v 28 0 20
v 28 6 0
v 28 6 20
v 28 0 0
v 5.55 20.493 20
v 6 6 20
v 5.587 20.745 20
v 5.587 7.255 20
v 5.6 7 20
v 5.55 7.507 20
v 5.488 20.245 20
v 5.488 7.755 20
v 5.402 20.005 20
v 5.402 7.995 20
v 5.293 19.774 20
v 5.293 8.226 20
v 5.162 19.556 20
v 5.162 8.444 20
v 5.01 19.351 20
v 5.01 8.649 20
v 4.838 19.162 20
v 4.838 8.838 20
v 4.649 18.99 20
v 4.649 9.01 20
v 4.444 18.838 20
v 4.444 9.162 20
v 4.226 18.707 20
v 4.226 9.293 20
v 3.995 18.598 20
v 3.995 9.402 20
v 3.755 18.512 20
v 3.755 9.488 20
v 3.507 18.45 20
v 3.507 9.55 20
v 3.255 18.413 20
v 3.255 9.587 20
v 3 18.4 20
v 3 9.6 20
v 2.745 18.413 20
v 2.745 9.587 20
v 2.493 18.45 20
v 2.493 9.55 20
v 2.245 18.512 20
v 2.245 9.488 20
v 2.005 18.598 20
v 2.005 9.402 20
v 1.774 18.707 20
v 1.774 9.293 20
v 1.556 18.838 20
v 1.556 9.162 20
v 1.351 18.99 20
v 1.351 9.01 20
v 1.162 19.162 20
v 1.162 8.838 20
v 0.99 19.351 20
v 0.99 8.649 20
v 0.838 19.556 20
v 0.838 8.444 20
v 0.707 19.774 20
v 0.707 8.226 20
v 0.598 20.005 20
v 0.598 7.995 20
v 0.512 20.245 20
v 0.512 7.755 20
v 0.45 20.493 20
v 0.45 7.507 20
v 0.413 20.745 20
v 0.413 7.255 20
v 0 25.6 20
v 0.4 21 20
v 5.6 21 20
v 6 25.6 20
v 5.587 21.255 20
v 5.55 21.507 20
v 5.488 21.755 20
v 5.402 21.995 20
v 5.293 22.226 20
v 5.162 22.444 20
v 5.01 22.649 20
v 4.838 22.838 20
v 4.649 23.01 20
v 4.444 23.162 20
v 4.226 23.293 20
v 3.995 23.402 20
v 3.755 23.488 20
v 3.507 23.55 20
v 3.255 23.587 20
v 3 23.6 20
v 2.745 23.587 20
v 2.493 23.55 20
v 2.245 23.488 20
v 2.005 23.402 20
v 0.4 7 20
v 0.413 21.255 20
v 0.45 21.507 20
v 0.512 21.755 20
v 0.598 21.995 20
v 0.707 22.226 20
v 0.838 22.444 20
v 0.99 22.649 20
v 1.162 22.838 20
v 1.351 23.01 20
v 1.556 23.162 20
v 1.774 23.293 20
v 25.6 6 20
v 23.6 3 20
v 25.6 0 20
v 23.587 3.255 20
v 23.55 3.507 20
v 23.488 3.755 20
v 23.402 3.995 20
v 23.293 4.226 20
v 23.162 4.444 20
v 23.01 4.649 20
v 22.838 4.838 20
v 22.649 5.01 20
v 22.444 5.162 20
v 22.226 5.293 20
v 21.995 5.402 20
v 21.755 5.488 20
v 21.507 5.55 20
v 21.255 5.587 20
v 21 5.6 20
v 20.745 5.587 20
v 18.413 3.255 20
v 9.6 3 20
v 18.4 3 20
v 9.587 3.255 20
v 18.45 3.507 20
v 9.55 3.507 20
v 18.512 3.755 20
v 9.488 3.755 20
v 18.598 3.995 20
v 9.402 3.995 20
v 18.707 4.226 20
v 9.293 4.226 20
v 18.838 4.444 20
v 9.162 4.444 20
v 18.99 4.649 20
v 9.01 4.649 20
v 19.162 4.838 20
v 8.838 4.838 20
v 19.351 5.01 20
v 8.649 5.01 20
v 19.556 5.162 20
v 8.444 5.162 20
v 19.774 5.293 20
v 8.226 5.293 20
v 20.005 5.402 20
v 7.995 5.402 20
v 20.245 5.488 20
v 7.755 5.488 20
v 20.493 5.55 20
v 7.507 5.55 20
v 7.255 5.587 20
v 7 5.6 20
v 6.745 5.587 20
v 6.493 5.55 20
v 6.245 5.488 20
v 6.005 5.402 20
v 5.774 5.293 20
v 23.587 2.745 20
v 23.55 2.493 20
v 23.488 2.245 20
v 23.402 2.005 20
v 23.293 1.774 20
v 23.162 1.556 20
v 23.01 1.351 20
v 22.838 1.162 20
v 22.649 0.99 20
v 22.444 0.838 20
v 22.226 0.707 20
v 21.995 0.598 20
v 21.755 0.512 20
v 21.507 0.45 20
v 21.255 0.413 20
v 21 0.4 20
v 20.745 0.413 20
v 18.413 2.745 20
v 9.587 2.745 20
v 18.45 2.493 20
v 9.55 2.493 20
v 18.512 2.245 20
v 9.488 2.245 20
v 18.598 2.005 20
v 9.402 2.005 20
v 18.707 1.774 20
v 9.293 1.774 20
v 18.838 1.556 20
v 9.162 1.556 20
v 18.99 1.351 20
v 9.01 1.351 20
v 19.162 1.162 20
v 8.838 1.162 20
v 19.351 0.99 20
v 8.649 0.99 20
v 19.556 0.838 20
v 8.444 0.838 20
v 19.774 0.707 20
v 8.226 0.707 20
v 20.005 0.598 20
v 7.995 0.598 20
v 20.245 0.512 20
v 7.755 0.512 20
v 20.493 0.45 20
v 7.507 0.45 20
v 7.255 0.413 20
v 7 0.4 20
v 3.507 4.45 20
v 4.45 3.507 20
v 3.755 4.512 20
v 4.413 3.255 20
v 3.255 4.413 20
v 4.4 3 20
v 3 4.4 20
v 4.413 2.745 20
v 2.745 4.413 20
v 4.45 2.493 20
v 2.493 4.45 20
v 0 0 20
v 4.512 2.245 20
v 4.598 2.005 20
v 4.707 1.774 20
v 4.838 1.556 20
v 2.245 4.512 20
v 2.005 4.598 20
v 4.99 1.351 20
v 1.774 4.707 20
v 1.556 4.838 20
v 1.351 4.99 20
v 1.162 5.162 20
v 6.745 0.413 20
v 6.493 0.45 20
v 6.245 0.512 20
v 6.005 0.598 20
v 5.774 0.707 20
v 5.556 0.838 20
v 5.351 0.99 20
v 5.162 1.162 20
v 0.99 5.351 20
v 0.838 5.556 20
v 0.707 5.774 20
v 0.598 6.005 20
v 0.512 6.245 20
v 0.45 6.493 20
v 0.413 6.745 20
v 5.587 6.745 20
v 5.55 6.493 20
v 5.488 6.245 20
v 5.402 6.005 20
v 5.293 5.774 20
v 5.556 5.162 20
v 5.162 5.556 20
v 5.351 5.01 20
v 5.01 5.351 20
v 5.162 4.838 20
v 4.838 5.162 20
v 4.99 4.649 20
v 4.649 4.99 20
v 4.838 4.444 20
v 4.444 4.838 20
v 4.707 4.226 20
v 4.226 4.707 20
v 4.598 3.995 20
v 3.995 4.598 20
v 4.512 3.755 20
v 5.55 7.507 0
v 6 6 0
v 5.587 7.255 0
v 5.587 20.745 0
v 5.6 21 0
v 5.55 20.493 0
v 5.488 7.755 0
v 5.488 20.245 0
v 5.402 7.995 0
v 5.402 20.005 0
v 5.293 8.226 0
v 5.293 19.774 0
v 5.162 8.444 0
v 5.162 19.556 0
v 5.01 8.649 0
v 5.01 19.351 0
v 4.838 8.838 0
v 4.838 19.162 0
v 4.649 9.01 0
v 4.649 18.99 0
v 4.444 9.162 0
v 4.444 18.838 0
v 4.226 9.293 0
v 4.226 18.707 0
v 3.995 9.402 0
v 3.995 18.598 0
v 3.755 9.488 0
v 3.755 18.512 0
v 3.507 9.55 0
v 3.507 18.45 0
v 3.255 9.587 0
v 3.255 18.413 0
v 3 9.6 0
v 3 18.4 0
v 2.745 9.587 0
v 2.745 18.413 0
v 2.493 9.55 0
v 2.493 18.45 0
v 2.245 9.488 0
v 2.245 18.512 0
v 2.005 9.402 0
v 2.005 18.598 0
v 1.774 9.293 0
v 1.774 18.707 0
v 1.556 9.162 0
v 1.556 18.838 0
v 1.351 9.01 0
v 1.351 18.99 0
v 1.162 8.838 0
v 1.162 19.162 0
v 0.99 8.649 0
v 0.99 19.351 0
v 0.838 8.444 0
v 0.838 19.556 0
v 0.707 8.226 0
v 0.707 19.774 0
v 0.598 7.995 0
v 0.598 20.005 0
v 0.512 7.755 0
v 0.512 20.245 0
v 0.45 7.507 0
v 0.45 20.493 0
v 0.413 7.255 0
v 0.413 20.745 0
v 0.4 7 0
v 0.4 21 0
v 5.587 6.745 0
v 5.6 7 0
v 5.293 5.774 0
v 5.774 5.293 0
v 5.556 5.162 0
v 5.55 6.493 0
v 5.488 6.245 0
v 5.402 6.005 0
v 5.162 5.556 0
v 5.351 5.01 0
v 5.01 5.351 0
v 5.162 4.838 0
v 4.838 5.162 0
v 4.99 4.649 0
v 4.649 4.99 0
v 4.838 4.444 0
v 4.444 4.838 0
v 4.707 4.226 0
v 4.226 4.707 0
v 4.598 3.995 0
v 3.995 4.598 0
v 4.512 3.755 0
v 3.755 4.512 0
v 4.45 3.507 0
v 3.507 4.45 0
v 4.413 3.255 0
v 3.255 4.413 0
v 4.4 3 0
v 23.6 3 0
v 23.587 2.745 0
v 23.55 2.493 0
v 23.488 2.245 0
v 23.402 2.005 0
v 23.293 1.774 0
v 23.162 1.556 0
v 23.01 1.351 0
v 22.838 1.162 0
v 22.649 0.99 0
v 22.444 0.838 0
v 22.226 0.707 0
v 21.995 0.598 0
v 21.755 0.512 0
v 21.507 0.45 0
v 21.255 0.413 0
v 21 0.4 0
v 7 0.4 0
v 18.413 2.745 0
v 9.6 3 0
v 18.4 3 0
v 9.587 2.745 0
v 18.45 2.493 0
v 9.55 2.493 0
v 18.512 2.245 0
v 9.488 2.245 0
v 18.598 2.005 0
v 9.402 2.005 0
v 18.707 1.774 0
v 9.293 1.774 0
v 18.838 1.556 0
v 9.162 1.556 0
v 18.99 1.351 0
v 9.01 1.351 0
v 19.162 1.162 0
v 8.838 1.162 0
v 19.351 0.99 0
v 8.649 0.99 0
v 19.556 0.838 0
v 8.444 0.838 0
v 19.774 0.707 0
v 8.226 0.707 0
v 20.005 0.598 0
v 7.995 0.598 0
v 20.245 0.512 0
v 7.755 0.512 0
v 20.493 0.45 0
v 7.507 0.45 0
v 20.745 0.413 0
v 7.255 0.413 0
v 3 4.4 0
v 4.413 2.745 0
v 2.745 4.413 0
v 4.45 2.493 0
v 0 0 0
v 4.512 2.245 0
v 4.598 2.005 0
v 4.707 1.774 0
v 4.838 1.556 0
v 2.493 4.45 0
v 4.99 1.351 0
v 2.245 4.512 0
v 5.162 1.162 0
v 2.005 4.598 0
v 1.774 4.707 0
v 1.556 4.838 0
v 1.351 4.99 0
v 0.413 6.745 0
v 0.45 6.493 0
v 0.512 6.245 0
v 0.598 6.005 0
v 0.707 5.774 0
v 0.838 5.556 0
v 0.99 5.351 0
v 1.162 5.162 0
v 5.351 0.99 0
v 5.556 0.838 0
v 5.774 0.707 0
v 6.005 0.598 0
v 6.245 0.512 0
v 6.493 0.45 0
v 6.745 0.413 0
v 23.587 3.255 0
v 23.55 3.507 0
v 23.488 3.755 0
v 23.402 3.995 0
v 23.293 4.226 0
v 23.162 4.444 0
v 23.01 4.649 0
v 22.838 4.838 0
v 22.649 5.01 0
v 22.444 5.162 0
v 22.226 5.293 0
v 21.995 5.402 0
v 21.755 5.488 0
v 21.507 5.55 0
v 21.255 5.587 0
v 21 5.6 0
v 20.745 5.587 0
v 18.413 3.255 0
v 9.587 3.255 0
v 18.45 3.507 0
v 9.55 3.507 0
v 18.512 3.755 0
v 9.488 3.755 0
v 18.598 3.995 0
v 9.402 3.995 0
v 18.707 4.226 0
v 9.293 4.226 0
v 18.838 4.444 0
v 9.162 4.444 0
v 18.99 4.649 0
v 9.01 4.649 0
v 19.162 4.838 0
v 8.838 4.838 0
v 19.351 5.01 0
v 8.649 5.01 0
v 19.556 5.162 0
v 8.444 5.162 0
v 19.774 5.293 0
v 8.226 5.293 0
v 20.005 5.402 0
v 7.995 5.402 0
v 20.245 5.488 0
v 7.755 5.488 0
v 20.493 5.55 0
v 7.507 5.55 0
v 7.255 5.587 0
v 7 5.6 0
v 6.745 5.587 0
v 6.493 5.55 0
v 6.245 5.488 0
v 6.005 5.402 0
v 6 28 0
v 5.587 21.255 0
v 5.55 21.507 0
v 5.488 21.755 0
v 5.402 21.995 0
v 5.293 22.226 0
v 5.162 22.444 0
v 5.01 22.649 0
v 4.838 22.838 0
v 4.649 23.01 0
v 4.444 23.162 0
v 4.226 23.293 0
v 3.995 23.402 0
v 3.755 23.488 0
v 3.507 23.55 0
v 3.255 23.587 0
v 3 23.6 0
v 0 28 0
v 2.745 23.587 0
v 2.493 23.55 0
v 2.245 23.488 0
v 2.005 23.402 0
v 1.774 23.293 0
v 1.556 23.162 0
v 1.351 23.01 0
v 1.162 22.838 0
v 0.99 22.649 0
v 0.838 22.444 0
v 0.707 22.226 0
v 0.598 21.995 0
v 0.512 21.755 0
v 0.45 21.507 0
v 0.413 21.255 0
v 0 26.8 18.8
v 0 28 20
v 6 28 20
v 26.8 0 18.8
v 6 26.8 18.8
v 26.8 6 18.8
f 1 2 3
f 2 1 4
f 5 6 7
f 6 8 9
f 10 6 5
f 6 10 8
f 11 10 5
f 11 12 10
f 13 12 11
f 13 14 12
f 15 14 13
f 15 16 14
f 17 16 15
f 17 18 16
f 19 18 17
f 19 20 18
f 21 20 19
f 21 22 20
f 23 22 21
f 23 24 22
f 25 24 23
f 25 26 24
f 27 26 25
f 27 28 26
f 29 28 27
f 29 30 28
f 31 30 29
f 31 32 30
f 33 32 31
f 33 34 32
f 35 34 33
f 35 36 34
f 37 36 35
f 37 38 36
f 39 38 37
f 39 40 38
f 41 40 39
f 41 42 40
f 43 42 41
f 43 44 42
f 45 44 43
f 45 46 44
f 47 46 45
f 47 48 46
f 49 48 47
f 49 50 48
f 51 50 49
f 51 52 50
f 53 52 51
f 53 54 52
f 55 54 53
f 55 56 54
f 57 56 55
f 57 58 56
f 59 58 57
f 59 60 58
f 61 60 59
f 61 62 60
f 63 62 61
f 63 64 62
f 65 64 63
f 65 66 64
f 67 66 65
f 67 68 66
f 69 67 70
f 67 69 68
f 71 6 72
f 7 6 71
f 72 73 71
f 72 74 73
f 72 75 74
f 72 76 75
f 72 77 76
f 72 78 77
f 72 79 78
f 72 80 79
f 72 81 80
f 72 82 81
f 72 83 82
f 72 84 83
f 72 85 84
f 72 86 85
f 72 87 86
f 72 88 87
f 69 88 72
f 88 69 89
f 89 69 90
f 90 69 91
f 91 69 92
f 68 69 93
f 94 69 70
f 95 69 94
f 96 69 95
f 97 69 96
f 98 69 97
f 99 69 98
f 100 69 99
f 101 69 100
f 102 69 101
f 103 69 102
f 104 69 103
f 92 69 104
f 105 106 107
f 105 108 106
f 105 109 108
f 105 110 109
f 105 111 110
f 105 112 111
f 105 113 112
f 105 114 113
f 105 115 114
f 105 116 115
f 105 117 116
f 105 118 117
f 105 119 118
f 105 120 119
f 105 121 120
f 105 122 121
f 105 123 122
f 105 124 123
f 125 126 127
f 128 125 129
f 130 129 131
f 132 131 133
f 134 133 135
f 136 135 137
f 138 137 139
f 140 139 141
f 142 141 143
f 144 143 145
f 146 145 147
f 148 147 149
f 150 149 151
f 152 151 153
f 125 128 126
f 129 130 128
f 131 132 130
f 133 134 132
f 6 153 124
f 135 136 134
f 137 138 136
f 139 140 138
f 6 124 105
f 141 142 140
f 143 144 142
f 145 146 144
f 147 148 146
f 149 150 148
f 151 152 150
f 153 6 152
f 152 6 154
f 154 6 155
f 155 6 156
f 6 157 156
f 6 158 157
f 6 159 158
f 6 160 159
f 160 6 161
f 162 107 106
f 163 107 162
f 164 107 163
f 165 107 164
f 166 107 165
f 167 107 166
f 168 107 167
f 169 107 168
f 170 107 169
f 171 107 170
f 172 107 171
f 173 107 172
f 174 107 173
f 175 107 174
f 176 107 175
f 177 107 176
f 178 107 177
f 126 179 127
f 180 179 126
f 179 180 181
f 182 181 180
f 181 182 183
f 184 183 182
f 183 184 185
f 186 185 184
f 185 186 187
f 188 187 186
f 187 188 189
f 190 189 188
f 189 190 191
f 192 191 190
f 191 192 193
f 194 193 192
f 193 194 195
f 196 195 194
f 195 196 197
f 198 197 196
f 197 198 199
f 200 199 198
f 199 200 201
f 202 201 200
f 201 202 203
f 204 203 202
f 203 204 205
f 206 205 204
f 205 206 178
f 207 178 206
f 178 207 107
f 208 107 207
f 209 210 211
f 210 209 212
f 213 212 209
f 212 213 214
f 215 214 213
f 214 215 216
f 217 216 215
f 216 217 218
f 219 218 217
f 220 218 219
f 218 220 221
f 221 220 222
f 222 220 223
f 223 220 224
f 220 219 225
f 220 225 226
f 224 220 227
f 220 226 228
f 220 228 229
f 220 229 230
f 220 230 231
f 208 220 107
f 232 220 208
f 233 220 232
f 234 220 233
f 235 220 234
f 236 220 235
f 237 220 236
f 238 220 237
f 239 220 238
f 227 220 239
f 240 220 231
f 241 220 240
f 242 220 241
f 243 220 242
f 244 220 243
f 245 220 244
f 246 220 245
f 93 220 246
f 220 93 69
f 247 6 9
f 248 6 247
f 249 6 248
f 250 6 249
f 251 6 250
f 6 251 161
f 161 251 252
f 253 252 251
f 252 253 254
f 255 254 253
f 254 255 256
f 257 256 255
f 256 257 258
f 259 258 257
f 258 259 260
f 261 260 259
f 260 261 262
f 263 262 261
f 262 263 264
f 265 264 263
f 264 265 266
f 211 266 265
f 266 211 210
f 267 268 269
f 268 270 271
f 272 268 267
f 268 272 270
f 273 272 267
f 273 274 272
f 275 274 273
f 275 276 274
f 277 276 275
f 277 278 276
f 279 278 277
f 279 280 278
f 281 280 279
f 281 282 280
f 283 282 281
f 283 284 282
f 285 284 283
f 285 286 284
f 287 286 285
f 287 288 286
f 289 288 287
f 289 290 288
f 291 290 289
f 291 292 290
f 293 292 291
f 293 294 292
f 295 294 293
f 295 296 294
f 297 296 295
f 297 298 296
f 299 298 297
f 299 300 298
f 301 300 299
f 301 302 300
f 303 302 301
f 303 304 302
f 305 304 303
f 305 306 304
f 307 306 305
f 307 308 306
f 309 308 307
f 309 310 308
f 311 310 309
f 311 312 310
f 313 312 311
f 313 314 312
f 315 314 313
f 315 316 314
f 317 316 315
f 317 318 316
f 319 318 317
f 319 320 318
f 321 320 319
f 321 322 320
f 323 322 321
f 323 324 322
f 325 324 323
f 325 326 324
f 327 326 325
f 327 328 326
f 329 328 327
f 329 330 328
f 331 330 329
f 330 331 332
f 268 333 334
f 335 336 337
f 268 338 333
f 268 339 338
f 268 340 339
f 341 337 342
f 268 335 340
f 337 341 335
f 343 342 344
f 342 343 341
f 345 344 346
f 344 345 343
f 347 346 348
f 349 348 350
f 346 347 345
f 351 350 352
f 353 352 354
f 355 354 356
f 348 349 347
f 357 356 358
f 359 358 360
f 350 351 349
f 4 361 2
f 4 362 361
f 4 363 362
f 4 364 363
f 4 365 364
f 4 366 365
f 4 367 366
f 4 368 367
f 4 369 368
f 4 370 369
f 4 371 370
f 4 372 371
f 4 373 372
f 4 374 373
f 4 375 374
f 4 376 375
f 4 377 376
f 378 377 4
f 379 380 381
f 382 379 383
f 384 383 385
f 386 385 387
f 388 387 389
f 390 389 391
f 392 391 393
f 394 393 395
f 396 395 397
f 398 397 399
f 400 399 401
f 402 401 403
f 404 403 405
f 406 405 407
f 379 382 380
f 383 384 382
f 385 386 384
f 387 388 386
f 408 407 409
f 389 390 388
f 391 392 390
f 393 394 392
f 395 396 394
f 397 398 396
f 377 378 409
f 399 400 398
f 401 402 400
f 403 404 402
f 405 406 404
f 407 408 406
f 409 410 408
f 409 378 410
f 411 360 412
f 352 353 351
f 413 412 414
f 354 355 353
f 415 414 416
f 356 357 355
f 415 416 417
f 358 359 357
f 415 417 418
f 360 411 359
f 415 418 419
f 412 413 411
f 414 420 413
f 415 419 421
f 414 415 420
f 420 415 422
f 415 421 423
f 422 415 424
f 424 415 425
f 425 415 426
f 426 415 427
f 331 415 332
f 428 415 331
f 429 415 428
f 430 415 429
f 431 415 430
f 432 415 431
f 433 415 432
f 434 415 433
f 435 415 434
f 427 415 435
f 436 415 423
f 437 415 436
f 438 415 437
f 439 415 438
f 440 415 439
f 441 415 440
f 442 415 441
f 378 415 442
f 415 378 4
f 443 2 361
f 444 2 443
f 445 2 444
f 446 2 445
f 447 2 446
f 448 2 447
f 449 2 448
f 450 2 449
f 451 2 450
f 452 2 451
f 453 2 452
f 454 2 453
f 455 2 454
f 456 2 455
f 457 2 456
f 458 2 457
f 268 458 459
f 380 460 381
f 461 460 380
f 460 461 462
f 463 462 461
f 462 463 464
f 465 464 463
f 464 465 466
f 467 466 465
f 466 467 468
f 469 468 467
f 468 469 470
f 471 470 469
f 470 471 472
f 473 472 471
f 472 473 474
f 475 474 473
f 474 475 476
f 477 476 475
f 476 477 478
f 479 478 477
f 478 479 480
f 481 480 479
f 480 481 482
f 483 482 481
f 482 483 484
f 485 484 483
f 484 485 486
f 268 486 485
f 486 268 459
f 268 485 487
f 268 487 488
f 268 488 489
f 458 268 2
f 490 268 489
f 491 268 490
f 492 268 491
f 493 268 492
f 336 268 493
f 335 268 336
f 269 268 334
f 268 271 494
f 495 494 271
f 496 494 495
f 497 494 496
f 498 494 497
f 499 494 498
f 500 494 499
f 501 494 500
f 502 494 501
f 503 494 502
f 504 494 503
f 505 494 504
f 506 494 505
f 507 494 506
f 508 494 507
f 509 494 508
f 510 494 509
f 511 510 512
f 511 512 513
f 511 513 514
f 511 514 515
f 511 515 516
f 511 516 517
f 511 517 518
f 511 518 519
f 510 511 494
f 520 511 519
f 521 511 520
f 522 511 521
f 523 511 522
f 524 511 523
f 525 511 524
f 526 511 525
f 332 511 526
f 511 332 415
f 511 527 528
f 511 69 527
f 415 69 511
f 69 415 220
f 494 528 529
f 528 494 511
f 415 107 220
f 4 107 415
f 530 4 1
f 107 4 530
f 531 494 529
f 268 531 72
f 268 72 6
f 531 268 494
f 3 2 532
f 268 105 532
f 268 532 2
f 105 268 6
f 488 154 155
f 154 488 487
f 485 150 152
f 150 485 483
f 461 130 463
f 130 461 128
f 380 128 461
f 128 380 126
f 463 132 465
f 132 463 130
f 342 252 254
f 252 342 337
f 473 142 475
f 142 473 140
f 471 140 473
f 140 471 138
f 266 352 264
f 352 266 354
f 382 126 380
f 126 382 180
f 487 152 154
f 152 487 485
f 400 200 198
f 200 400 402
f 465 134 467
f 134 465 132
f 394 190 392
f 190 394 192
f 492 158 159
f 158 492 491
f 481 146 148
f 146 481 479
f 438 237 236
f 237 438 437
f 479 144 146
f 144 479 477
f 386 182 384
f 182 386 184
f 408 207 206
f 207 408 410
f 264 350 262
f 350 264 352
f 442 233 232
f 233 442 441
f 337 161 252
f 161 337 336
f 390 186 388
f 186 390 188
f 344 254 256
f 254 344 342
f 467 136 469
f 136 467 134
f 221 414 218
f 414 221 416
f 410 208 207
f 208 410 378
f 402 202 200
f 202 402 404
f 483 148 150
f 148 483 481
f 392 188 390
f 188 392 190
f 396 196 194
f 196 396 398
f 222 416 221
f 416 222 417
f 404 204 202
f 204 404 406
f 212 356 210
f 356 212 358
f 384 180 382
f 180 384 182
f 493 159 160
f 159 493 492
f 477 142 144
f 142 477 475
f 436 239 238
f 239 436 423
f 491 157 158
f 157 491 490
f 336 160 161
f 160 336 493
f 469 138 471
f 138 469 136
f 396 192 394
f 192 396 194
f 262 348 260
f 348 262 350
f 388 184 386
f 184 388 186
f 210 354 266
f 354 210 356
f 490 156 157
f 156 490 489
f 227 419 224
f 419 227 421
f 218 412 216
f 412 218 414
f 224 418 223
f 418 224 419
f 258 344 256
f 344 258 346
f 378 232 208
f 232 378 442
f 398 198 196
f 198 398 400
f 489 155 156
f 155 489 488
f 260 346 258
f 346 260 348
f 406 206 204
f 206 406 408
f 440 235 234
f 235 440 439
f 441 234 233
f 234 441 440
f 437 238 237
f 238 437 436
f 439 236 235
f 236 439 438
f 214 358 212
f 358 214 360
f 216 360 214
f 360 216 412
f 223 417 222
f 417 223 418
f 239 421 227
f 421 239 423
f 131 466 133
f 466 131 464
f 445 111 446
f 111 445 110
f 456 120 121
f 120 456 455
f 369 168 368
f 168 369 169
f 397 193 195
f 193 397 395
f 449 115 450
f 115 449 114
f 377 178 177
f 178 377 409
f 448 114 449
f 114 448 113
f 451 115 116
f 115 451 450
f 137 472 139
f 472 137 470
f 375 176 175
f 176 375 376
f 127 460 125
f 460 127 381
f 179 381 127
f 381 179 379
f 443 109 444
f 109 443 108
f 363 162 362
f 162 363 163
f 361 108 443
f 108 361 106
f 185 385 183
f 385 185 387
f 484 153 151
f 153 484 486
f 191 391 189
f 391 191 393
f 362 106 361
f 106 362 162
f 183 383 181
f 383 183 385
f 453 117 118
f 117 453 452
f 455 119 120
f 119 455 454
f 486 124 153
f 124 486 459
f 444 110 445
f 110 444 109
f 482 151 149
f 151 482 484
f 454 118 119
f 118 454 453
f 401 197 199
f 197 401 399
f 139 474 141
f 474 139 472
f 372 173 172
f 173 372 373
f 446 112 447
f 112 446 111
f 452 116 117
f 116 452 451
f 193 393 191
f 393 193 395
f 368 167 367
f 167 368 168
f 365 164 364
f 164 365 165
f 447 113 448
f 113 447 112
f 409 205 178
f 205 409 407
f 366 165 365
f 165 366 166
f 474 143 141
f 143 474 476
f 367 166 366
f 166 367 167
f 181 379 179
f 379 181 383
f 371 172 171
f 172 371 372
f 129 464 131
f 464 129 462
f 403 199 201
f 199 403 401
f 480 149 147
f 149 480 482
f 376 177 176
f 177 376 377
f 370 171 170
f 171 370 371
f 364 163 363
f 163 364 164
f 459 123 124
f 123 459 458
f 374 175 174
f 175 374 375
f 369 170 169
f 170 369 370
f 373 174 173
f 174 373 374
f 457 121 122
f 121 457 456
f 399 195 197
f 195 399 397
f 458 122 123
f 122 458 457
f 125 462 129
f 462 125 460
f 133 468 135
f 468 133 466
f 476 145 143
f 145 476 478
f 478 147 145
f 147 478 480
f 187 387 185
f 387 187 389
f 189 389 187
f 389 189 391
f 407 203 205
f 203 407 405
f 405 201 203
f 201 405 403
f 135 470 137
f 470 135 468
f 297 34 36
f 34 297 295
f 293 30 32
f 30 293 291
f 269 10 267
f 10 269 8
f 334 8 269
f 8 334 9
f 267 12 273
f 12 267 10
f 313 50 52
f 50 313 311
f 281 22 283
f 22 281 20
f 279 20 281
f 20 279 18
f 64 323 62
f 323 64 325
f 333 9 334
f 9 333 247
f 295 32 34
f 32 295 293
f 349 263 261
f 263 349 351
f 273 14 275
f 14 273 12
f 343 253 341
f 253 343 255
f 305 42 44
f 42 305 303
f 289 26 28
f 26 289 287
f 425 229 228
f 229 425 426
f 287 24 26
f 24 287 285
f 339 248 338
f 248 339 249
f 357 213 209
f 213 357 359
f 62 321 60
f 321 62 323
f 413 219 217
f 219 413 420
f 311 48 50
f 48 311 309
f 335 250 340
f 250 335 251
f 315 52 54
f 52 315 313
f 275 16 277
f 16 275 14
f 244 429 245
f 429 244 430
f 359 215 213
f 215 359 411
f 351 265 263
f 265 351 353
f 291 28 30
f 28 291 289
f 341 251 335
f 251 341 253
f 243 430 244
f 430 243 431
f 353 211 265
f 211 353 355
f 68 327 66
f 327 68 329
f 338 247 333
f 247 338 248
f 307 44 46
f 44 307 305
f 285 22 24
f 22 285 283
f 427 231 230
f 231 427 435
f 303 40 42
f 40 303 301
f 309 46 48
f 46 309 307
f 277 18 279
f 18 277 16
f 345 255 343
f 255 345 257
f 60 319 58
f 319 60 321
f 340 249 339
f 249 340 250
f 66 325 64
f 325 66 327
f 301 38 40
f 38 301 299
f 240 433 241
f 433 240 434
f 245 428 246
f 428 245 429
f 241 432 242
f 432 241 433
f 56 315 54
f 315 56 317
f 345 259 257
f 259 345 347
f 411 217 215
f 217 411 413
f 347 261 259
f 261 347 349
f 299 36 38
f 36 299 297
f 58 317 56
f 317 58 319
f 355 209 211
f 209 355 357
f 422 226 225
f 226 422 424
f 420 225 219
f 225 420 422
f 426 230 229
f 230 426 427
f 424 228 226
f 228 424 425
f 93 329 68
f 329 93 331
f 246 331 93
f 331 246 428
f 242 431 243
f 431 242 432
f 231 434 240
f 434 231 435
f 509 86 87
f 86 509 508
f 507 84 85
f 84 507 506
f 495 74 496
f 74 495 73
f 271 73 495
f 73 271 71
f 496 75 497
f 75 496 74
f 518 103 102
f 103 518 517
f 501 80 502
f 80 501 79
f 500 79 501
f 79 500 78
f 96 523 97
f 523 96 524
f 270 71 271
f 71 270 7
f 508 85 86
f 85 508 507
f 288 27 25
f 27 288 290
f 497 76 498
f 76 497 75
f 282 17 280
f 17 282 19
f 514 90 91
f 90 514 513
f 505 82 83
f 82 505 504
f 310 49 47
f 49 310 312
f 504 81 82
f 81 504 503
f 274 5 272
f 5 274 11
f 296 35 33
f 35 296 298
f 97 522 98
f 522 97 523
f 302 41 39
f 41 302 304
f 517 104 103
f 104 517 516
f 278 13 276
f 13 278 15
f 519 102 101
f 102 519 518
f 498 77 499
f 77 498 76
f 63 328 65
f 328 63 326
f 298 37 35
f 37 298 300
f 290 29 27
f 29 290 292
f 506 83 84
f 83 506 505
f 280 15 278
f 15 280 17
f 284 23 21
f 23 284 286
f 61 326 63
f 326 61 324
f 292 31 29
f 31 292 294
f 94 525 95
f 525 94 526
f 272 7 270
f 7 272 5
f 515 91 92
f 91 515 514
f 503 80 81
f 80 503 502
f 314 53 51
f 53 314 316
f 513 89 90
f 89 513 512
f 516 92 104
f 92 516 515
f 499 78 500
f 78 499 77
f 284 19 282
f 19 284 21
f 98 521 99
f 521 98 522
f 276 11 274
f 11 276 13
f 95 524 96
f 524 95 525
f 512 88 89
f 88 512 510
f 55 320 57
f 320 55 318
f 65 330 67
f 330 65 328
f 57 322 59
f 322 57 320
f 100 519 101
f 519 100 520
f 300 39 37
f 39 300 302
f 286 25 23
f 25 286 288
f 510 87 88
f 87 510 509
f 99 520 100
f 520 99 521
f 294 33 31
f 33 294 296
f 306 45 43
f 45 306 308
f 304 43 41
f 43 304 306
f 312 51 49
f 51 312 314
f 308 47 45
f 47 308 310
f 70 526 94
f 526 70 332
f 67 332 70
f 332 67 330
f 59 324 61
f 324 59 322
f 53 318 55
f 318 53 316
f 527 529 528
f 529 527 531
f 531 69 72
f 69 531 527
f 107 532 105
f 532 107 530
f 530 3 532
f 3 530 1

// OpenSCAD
$fn = 64;

// A extrusion bracket overall: [28, 28, 20]
module corner_bracket(size=[28,28,20], wall=6, hole_d=5.2, hole_edge=7, chamfer=1.2) {
    sx = size[0];
    sy = size[1];
    sz = size[2];

    // Keep walls valid
    wall2 = min(wall, min(sx,sy)/2 - 0.5);

    difference() {
        // Main connected L-bracket body (one solid)
        // Outer block minus inner corner to form an L in plan view
        difference() {
            cube([sx, sy, sz], center=false);

            // Inner void to create L shape (opens to +X,+Y)
            translate([wall2, wall2, -0.1])
                cube([sx - wall2, sy - wall2, sz + 0.2], center=false);
        }

        // Mounting holes (2 per leg), through thickness (Z)
        // Leg along X (bottom flange): y within [0, wall2]
        for (xpos = [hole_edge, sx - hole_edge]) {
            translate([xpos, wall2/2, sz/2])
                cylinder(h=sz + 0.6, d=hole_d, center=true);
        }

        // Leg along Y (side flange): x within [0, wall2]
        for (ypos = [hole_edge, sy - hole_edge]) {
            translate([wall2/2, ypos, sz/2])
                cylinder(h=sz + 0.6, d=hole_d, center=true);
        }

        // Small outer-edge chamfers (subtractive), kept connected and non-floating
        if (chamfer > 0) {
            // Chamfer along outer top edges of both legs
            // Along X outer edge at y=sy
            translate([0, sy - chamfer, sz - chamfer])
                rotate([45, 0, 0])
                    cube([sx, chamfer*2, chamfer*2], center=false);

            // Along Y outer edge at x=sx
            translate([sx - chamfer, 0, sz - chamfer])
                rotate([0, -45, 0])
                    cube([chamfer*2, sy, chamfer*2], center=false);

            // Outer vertical corner chamfer at (sx,sy)
            translate([sx - chamfer, sy - chamfer, 0])
                rotate([0, 0, 45])
                    cube([chamfer*2, chamfer*2, sz], center=false);
        }
    }
}

corner_bracket();
